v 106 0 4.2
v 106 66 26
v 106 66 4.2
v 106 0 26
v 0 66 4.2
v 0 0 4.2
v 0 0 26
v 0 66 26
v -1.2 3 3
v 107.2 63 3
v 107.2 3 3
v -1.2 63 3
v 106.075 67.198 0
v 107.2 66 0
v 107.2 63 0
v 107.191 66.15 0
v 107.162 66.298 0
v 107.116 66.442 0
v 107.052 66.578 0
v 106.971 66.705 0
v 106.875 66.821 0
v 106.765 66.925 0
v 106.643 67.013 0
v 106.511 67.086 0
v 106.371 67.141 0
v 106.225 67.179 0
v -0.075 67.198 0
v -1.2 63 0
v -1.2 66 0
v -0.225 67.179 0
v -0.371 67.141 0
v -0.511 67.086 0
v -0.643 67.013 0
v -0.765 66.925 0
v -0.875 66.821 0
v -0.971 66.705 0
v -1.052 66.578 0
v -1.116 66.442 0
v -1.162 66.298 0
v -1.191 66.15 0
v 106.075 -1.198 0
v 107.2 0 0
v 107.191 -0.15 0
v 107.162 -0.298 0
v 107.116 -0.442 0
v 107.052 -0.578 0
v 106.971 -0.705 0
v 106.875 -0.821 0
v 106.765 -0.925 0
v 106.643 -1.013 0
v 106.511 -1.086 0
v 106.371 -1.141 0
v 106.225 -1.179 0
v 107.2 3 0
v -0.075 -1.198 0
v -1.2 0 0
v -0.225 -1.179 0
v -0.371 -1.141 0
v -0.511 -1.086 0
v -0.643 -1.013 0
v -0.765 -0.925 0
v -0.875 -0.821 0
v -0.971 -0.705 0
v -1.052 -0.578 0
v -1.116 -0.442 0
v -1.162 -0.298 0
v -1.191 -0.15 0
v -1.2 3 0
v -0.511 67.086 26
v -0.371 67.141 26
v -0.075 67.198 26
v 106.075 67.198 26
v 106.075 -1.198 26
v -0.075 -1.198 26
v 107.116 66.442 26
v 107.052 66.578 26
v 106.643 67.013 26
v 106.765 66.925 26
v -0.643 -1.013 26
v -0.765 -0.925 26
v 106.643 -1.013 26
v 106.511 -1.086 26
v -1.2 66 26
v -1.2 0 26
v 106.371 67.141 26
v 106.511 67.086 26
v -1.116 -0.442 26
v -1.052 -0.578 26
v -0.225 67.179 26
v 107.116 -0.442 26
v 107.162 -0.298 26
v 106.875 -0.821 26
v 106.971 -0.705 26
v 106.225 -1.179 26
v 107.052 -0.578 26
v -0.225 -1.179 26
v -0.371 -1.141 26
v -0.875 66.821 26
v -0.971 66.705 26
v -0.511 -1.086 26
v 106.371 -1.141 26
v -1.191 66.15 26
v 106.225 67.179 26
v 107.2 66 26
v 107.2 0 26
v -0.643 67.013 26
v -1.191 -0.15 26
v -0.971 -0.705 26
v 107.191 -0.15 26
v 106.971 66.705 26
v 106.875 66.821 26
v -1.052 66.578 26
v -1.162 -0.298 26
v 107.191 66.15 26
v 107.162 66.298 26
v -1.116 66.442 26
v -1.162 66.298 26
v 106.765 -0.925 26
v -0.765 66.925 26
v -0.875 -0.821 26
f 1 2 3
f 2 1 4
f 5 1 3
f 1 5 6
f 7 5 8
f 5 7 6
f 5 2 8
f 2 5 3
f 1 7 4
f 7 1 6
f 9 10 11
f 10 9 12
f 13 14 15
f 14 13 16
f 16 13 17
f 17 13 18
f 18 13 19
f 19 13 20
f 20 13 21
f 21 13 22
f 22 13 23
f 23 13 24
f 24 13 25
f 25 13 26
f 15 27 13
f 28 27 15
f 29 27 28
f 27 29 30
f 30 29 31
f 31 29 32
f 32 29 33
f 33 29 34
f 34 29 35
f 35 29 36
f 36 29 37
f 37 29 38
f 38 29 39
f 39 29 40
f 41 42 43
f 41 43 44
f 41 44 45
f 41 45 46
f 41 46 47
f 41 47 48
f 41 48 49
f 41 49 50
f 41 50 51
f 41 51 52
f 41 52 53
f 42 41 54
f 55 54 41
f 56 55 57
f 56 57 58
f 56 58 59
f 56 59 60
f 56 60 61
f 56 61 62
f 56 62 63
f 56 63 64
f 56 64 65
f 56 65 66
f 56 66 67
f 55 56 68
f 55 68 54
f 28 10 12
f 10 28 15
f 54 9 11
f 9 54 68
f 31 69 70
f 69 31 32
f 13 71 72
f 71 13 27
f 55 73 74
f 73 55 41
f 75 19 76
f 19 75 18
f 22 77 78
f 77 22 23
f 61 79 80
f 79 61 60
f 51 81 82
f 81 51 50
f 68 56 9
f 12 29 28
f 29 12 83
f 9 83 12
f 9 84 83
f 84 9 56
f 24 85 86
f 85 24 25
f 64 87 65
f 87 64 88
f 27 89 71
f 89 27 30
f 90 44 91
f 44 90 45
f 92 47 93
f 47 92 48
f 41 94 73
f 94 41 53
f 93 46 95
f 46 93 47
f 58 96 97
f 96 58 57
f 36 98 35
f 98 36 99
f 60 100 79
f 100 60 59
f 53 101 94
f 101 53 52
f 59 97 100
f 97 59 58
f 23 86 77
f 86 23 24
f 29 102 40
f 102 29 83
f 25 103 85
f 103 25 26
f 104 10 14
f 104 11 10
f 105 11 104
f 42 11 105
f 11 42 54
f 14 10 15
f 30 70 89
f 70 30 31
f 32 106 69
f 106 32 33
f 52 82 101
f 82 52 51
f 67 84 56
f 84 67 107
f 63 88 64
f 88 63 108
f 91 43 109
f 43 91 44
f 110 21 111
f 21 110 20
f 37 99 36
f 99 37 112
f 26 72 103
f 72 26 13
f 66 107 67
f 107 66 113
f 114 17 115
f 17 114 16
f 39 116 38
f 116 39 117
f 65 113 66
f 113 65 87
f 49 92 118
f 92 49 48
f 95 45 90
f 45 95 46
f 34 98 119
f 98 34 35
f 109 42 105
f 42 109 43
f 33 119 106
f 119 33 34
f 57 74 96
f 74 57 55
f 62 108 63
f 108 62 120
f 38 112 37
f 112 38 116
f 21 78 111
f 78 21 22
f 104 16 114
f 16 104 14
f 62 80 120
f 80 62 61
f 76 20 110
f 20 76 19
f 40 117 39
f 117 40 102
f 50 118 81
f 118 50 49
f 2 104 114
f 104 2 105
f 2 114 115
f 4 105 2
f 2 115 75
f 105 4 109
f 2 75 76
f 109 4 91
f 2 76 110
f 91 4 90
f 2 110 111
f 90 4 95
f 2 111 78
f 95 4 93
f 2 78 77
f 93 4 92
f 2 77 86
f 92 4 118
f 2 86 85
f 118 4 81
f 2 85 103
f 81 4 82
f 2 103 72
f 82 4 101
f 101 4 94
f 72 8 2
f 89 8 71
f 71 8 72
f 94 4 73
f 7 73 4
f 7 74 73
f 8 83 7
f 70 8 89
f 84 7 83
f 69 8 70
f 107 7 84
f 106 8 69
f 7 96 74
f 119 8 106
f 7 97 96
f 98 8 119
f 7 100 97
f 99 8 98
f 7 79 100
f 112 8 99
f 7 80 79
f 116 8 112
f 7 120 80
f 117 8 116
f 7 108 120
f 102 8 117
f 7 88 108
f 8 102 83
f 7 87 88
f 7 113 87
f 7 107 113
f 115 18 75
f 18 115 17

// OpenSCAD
length = 106;
width = 66;
height = 13;
wall = 1.2;
wall2 = 2.4;
feet_height = 3;
$fn = 50;

difference(){
    minkowski() {
        cylinder(d=wall2,h=height);
        cube([length, width, height]);
    }
    union(){
        translate([0,0,feet_height + wall])
            cube([length, width, height *2]);
        translate([-5,feet_height,0])
            cube([length + 10, width-6, feet_height]);

    }
}
